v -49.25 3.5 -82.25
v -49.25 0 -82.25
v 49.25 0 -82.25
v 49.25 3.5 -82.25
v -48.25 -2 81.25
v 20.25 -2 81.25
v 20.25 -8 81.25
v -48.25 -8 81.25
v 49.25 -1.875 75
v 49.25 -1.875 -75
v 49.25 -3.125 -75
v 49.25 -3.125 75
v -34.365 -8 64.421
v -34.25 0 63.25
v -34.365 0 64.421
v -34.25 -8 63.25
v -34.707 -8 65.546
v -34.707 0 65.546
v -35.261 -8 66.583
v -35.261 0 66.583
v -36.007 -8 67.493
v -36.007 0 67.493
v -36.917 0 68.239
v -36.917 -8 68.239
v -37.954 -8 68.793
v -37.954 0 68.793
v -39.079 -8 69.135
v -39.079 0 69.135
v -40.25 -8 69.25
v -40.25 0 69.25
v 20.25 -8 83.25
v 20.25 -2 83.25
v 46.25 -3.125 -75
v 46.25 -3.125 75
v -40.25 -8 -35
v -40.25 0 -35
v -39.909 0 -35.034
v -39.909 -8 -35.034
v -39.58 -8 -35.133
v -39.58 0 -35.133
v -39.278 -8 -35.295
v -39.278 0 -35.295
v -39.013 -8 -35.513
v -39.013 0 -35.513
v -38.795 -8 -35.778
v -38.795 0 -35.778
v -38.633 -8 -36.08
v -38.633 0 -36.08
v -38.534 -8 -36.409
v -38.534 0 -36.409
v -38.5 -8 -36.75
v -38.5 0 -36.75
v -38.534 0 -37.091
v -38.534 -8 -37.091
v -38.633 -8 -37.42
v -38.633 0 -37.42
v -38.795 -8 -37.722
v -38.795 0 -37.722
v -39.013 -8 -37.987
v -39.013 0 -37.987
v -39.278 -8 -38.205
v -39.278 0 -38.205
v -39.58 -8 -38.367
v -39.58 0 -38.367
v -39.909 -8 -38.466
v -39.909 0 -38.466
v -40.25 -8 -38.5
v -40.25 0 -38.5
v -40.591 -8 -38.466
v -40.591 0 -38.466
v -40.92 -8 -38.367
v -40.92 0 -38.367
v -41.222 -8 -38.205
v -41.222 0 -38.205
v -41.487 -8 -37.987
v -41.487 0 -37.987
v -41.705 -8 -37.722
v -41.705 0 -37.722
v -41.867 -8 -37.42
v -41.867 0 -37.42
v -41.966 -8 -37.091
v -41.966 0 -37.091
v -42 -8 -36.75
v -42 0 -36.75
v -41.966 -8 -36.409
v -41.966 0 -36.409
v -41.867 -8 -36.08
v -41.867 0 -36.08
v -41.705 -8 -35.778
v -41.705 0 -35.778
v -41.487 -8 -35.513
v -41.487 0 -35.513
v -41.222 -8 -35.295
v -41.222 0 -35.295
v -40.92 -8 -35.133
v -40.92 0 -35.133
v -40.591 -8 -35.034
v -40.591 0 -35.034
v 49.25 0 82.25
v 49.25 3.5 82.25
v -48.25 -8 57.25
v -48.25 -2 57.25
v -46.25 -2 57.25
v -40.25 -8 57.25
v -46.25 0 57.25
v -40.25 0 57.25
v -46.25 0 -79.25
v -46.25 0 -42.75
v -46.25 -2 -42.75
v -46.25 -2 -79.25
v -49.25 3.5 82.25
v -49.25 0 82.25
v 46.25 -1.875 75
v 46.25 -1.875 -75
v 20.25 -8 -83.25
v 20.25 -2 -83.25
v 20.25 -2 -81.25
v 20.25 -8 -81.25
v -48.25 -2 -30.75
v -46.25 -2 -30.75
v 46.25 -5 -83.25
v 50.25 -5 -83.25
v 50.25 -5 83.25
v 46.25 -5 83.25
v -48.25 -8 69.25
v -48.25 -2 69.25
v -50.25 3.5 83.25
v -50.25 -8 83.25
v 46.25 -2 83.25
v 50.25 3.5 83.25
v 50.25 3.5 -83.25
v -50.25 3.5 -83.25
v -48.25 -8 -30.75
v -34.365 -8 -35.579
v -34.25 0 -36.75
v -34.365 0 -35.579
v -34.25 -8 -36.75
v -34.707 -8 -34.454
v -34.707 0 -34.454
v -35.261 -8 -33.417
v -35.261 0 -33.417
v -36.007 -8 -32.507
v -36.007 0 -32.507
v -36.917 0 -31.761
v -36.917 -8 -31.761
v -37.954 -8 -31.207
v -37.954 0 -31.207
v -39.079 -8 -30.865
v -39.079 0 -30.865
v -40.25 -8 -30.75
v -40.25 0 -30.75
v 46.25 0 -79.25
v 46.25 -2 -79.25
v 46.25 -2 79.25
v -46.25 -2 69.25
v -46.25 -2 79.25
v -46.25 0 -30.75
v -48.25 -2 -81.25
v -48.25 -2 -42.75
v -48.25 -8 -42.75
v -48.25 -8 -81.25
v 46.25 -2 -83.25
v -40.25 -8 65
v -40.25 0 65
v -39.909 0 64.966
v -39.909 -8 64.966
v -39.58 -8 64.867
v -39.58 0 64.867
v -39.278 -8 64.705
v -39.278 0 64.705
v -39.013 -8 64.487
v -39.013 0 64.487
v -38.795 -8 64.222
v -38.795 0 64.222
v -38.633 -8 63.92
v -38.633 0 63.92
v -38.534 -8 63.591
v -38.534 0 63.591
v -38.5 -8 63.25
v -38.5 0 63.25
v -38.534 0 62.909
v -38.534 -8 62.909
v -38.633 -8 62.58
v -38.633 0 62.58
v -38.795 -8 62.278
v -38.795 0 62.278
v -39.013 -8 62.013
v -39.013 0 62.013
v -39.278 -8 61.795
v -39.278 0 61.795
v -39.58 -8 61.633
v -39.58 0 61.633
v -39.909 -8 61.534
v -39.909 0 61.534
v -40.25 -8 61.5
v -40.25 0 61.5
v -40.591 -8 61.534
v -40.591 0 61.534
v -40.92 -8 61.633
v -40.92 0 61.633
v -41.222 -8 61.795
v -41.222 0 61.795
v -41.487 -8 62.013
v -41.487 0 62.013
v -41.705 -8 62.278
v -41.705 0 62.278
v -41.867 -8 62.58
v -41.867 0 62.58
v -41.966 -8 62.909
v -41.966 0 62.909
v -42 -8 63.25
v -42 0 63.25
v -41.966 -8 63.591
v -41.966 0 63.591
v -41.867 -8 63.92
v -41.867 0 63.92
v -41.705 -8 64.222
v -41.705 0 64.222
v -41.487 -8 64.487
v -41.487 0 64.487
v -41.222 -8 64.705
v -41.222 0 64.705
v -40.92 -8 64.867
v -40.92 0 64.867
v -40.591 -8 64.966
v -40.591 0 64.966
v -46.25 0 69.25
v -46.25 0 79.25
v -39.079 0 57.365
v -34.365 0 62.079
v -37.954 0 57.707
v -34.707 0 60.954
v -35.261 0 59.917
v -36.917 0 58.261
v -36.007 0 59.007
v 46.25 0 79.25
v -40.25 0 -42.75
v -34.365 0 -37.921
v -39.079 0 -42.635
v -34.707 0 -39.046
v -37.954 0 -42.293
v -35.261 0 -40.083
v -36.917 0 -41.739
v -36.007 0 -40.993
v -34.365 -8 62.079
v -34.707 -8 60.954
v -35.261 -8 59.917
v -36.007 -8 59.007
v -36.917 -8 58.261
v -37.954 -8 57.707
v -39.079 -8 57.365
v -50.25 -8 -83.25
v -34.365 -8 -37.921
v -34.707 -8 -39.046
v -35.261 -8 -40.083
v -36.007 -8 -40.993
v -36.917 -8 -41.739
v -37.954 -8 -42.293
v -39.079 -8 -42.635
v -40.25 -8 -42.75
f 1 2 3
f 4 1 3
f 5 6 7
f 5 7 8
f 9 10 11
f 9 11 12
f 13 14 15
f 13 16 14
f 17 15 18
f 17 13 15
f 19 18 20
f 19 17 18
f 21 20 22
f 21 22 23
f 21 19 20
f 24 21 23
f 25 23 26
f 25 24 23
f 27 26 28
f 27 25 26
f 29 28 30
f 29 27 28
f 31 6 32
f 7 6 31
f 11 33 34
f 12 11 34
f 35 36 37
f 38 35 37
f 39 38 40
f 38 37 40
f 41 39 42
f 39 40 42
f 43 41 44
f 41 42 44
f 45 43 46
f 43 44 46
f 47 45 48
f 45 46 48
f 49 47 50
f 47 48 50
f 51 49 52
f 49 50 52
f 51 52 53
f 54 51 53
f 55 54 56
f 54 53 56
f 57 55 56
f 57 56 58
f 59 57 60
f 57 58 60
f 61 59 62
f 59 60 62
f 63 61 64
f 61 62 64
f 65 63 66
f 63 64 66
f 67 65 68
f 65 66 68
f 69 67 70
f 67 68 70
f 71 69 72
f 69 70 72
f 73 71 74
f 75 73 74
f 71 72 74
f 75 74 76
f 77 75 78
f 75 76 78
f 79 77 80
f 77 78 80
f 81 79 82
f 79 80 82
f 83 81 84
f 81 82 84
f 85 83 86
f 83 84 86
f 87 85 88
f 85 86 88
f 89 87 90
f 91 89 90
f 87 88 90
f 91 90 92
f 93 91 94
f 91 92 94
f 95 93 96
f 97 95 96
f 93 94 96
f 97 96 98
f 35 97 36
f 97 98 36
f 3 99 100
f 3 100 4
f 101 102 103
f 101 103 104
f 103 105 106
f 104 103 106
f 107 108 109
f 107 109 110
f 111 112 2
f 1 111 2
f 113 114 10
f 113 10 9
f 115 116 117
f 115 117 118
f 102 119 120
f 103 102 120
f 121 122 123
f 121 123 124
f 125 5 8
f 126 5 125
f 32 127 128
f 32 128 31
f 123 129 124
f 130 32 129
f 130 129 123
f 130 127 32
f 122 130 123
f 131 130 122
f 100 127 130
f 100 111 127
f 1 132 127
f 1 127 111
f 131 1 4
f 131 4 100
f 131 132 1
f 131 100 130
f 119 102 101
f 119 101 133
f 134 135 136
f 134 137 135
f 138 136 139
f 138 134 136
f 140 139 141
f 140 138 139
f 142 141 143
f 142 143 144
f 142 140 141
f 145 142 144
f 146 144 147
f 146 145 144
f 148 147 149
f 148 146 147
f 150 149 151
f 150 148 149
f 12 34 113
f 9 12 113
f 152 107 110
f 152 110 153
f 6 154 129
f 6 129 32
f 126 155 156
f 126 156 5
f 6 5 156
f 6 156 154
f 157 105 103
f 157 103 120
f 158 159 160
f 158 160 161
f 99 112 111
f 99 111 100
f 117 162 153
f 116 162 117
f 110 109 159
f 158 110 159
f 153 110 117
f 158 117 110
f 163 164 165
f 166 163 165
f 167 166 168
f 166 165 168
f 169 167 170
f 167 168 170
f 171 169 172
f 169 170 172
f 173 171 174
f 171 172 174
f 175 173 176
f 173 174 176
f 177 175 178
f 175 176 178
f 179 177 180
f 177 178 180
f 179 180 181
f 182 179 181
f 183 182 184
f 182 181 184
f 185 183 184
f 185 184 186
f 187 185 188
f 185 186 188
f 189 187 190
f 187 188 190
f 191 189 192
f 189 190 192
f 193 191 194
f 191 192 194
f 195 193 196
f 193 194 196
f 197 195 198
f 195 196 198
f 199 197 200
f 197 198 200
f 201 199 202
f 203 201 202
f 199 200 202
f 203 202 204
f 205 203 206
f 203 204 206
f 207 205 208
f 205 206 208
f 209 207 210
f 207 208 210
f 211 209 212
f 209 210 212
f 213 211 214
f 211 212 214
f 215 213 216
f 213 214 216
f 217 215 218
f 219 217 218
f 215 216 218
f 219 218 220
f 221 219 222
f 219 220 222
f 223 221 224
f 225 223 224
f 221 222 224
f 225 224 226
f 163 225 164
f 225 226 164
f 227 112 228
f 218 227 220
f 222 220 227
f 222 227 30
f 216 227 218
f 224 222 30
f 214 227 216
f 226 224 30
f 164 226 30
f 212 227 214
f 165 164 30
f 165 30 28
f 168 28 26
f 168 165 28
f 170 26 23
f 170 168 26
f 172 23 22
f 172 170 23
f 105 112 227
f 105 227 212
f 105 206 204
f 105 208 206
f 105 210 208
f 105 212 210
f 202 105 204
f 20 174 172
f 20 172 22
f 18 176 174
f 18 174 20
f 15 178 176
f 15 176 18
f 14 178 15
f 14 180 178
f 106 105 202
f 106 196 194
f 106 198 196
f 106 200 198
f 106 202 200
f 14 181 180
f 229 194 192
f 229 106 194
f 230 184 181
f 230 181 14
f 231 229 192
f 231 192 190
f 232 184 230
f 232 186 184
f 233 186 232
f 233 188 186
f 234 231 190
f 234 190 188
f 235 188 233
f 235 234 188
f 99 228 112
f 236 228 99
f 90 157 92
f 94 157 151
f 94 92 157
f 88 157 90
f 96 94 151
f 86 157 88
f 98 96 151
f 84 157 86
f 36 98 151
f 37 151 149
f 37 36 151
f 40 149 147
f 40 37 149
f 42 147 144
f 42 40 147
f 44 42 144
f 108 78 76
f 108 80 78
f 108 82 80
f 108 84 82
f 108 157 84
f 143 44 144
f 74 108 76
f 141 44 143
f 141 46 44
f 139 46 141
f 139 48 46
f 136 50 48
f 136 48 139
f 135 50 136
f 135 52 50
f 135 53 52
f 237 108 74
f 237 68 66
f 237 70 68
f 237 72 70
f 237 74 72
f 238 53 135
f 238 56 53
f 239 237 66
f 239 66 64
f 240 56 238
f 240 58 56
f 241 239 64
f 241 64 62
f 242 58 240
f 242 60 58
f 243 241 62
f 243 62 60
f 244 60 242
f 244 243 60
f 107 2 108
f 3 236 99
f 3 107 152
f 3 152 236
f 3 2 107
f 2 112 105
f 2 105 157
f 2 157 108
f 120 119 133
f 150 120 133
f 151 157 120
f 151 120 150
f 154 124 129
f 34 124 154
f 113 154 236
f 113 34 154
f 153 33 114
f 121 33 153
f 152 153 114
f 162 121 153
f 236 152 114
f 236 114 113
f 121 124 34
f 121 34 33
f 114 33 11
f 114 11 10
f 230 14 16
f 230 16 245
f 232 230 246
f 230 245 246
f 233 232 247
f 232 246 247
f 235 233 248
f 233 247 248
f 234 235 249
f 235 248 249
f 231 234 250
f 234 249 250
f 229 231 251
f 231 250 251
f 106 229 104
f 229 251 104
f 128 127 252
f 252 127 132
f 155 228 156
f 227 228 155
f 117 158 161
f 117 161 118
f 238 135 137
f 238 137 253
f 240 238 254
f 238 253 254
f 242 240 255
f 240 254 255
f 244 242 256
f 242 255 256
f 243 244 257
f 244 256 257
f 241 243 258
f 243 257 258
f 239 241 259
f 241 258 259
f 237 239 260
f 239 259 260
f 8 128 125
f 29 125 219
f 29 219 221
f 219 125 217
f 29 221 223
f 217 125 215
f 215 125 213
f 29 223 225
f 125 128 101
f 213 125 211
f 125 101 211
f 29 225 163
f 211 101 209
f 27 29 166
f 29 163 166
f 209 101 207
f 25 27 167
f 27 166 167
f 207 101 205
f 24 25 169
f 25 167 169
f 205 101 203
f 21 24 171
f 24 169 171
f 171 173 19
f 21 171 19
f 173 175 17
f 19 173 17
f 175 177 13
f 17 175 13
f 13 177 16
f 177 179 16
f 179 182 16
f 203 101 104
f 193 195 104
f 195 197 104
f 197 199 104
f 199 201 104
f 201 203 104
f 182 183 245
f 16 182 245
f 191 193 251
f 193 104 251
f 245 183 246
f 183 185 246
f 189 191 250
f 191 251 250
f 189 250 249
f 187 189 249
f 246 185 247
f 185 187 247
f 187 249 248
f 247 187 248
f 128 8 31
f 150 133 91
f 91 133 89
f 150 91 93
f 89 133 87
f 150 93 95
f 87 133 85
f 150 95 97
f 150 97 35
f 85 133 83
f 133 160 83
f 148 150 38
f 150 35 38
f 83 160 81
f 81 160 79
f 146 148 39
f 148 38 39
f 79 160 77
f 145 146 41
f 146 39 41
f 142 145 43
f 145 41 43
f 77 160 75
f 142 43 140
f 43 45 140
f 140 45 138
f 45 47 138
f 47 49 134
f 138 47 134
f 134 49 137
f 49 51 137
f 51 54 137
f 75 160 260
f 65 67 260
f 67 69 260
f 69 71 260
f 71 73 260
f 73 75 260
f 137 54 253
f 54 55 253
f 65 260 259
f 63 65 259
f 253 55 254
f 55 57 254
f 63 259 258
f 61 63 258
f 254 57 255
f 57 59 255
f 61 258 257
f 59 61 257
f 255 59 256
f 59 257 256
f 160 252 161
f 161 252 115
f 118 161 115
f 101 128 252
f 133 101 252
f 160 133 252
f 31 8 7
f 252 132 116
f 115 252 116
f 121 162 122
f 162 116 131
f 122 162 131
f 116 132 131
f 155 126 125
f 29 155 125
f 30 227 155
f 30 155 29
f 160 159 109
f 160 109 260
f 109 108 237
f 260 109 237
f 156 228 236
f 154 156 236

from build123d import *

# Parameters (mm, degrees)
SKETCH2_W                                      = 100.5
SKETCH2_H                                      = 166.5
SKETCH2_W_2                                    = 98.5
SKETCH2_H_2                                    = 164.5
DIAPLAY_RING_DEPTH                             = 3.5
SKETCH3_W                                      = 100.5
SKETCH3_H                                      = 166.5
SKETCH3_W_2                                    = 92.5
SKETCH3_H_2                                    = 158.5
DISPLAY_LIP_DEPTH                              = 2
SKETCH4_W                                      = 16
SKETCH4_H                                      = 12
SKETCH4_R                                      = 1.75
DISPLAY_MOUNTING_TABS_DEPTH                    = 8
FILLET1_R                                      = 6
SKETCH7_W                                      = 100.5
SKETCH7_H                                      = 166.5
SKETCH7_W_2                                    = 96.5
SKETCH7_H_2                                    = 162.5
PERIMETER_EXTENSION_FOR_STRUCTURE_DEPTH        = 7
PERIMETER_EXTENSION_FOR_CAR_TRIM_DEPTH         = 2
SKETCH9_W                                      = 4
SKETCH9_H                                      = 166.5
MATERIAL_ADDITION_FOR_DISPLAY_MOUNTING_S_DEPTH = 4
SKETCH10_W                                     = 150
SKETCH10_H                                     = 1.25
DISPLAY_MOUNTING_SLOT_DEPTH                    = 3
SKETCH6_R                                      = 1.75
SHIFTER_SCREW_IF_DEPTH                         = 3
CUT_EXTRUDE2_DEPTH                             = 137.888640873
CUT_EXTRUDE2_DEPTH_BACK                        = 137.888640873


with BuildPart() as part:
    # Sketch2 → DIAPLAY RING (new body)
    with BuildSketch(Plane(origin=(0, 0, 0), x_dir=(1, 0, 0), z_dir=(0, 1, 0))):
        Rectangle(SKETCH2_W, SKETCH2_H)
        Rectangle(SKETCH2_W_2, SKETCH2_H_2, mode=Mode.SUBTRACT)
    extrude(amount=DIAPLAY_RING_DEPTH)

    # Sketch3 → DISPLAY LIP (add)
    with BuildSketch(Plane(origin=(0, 0, 0), x_dir=(1, 0, 0), z_dir=(0, 1, 0))):
        Rectangle(SKETCH3_W, SKETCH3_H)
        Rectangle(SKETCH3_W_2, SKETCH3_H_2, mode=Mode.SUBTRACT)
    extrude(amount=-DISPLAY_LIP_DEPTH)

    # Sketch4 → DISPLAY MOUNTING TABS (add)
    # profile 1 of 2: a face of its own
    with BuildSketch(Plane(origin=(0, 0, 0), x_dir=(1, 0, 0), z_dir=(0, 1, 0))):
        with Locations((-42.25, -63.25)):
            Rectangle(SKETCH4_W, SKETCH4_H)
        with Locations(Location((-40.25, -63.25, 0), (0, 0, 270))):
            Circle(SKETCH4_R, mode=Mode.SUBTRACT)
    # profile 2 of 2: a face of its own
    with BuildSketch(Plane(origin=(0, 0, 0), x_dir=(1, 0, 0), z_dir=(0, 1, 0))):
        with Locations((-42.25, 36.75)):
            Rectangle(SKETCH4_W, SKETCH4_H)
        with Locations(Location((-40.25, 36.75, 0), (0, 0, 270))):
            Circle(SKETCH4_R, mode=Mode.SUBTRACT)
    extrude(amount=-DISPLAY_MOUNTING_TABS_DEPTH)

    # Fillet1
    fillet1_edges = [part.edges().sort_by_distance(p)[0] for p in [
        (-34.25, -4, 57.25),
        (-34.25, -4, 69.25),
        (-34.25, -4, -42.75),
        (-34.25, -4, -30.75),
    ]]
    fillet(fillet1_edges, radius=FILLET1_R - 0.0001)  # a hair under: the kernel refuses the full size

    # Sketch7 → PERIMETER EXTENSION FOR STRUCTURE (add)
    with BuildSketch(Plane(origin=(0, -1, 0), x_dir=(1, 0, 0), z_dir=(0, 1, 0))):
        Rectangle(SKETCH7_W, SKETCH7_H)
        Rectangle(SKETCH7_W_2, SKETCH7_H_2, mode=Mode.SUBTRACT)
    extrude(amount=-PERIMETER_EXTENSION_FOR_STRUCTURE_DEPTH)

    # Sketch8 → PERIMETER EXTENSION FOR CAR TRIM (add)
    with BuildSketch(Plane.XZ.offset(8)):
        Polygon((25.25, 83.25), (50.25, 83.25), (50.25, -83.25), (25.25, -83.25), (25.25, -81.25), (48.25, -81.25), (48.25, 81.25), (25.25, 81.25), align=None)
    extrude(amount=PERIMETER_EXTENSION_FOR_CAR_TRIM_DEPTH)

    # Sketch9 → MATERIAL ADDITION FOR DISPLAY MOUNTING SLOT (add)
    with BuildSketch(Plane(origin=(0, -1, 0), x_dir=(1, 0, 0), z_dir=(0, 1, 0))):
        with Locations((48.25, 0)):
            Rectangle(SKETCH9_W, SKETCH9_H)
    extrude(amount=-MATERIAL_ADDITION_FOR_DISPLAY_MOUNTING_S_DEPTH)

    # Sketch10 → DISPLAY MOUNTING SLOT (cut)
    with BuildSketch(Plane.ZY.offset(-46.25)):
        with Locations((0, -2.5)):
            Rectangle(SKETCH10_W, SKETCH10_H)
    extrude(amount=-DISPLAY_MOUNTING_SLOT_DEPTH, mode=Mode.SUBTRACT)

    # Sketch11 → Cut-Extrude2 (cut, two sides: drawn at the far end of the back side and taken through both)
    with BuildSketch(Plane.XY.offset(-CUT_EXTRUDE2_DEPTH_BACK)):
        Polygon((50.25, -10), (50.25, -5), (46.25, -5), (46.25, -2), (20.25, -2), (20.25, -10), align=None)
    extrude(amount=CUT_EXTRUDE2_DEPTH + CUT_EXTRUDE2_DEPTH_BACK, mode=Mode.SUBTRACT)


with BuildPart() as body_2:
    # Sketch6 → SHIFTER SCREW IF (new body)
    with BuildSketch(Plane(origin=(0, -55, 0), x_dir=(1, 0, 0), z_dir=(0, 1, 0))):
        with BuildLine():
            Line((-50, 106.5), (12, 106.5))
            ThreePointArc((12, 106.5), (25.5, 93), (12, 79.5))
            Line((12, 79.5), (-50, 79.5))
            ThreePointArc((-50, 79.5), (-63.5, 93), (-50, 106.5))
        make_face()
        with Locations(Location((-50, 93, 0), (0, 0, 270))):
            Circle(SKETCH6_R, mode=Mode.SUBTRACT)
        with Locations(Location((12, 93, 0), (0, 0, 270))):
            Circle(SKETCH6_R, mode=Mode.SUBTRACT)
    extrude(amount=-SHIFTER_SCREW_IF_DEPTH)


solid = part.part
